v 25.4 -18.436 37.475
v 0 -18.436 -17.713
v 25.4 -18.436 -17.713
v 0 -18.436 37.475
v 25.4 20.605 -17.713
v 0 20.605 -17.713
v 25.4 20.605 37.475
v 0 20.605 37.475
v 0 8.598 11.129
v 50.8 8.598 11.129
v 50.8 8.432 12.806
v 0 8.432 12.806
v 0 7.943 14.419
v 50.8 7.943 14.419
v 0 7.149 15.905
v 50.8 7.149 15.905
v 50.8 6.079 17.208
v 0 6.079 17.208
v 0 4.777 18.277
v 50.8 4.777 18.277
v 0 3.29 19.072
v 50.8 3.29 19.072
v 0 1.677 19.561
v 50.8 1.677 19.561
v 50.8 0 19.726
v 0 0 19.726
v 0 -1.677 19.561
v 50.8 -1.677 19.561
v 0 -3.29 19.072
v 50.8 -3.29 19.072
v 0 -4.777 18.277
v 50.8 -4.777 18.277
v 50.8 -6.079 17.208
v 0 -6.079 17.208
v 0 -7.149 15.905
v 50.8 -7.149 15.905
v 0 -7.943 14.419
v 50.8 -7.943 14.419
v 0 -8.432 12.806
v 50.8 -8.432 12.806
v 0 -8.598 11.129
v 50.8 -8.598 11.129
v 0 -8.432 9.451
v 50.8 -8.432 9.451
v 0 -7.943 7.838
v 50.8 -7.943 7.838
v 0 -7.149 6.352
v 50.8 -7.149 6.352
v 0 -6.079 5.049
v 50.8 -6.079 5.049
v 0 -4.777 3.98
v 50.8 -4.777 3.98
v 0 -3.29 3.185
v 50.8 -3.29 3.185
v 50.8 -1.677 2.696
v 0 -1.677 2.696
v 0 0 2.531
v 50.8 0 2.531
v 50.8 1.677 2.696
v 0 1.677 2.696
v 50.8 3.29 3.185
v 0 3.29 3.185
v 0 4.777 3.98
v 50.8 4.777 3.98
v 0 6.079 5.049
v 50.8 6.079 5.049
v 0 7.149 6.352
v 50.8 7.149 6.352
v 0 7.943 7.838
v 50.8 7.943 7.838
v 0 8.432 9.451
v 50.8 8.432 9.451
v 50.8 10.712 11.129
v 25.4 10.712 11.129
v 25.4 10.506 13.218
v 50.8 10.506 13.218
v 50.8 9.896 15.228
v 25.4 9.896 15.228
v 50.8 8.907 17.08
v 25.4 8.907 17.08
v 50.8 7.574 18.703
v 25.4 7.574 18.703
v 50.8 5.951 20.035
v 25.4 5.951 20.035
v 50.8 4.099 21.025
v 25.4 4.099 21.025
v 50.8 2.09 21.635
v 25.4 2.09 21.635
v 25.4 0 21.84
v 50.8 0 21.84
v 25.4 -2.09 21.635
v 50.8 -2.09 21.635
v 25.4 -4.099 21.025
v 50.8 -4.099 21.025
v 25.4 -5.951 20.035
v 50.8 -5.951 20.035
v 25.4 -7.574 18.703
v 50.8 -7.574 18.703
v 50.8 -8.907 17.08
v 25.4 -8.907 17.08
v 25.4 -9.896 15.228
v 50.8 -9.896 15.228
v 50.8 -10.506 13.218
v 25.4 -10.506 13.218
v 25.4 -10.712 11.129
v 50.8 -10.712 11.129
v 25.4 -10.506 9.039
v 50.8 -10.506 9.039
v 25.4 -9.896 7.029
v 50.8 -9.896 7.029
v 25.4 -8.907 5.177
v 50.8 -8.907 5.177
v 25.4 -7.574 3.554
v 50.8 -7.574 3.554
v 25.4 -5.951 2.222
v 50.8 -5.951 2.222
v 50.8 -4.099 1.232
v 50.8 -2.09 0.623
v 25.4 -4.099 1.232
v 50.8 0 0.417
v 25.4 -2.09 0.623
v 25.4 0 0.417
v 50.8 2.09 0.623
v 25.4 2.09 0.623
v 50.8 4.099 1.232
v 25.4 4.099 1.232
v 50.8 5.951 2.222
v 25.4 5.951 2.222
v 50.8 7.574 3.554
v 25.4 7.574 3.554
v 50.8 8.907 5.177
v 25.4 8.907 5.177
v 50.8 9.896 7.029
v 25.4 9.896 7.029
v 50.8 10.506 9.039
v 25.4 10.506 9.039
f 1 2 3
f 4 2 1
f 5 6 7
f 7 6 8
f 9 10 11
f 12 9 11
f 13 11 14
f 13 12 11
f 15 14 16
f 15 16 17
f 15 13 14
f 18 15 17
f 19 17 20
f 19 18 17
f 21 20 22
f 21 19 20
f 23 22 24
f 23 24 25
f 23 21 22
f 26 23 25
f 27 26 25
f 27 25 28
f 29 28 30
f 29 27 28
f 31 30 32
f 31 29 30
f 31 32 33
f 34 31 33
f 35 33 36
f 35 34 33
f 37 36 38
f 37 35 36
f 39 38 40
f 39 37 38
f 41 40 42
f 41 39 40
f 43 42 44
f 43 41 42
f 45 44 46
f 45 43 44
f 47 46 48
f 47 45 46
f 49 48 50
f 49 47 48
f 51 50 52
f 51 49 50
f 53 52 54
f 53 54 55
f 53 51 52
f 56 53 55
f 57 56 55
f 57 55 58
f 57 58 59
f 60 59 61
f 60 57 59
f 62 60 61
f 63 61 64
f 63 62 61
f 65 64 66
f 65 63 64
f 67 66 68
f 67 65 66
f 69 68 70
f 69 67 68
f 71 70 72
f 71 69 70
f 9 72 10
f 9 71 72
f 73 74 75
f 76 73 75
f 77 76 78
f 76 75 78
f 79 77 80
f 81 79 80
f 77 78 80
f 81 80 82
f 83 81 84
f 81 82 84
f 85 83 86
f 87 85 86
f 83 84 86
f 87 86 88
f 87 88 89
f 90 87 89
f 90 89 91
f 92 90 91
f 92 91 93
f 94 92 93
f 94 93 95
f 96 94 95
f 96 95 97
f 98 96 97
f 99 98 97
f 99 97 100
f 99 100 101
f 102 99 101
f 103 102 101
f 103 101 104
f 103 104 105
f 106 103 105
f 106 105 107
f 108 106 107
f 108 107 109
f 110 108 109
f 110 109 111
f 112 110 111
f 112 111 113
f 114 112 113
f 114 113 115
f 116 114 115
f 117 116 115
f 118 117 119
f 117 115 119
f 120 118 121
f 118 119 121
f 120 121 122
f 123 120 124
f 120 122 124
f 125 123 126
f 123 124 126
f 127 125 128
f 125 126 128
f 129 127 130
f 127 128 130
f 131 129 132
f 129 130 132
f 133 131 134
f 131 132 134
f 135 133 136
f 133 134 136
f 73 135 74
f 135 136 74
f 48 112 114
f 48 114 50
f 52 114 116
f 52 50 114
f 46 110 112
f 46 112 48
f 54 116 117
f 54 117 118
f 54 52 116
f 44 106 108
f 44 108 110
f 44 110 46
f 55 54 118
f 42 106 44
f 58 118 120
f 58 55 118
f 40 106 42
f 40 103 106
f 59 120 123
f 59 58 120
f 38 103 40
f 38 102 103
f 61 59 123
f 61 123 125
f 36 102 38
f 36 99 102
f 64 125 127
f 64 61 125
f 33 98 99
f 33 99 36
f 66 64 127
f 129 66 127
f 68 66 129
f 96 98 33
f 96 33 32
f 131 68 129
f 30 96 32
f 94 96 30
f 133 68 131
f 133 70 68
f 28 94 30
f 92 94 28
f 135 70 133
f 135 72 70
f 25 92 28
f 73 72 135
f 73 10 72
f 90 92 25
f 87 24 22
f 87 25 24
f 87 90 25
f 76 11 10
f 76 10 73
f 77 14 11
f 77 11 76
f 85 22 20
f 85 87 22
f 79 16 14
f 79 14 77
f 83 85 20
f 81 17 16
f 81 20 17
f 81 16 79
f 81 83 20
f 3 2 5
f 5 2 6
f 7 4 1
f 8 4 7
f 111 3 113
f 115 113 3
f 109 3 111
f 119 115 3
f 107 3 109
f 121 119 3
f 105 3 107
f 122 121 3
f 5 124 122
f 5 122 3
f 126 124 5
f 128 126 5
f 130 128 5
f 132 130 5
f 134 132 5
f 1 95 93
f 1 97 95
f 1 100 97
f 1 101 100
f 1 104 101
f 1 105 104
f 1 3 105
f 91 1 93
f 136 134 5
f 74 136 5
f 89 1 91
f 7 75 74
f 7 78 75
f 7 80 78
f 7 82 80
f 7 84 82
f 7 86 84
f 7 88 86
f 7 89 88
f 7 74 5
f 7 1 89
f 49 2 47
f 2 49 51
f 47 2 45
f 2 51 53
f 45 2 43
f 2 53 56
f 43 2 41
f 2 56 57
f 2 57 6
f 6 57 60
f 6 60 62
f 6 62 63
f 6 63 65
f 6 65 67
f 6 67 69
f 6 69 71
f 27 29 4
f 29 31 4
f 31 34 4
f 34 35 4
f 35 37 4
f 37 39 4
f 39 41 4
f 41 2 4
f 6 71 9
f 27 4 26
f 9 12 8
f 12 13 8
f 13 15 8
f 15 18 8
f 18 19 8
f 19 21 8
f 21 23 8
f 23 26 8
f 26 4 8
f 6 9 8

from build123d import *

# Parameters (mm, degrees)
F0_R     = 10.711856
F0_R_2   = 8.597531
F1_DEPTH = 50.8
F0_W     = 39.041024
F0_H     = 55.187622
F2_DEPTH = 25.4


with BuildPart() as f1:
    # F0 (on Right) → F1 (new body)
    with BuildSketch(Plane.YZ):
        with Locations((0, 11.128576)):
            Circle(F0_R)
        with Locations((0, 11.128576)):
            Circle(F0_R_2, mode=Mode.SUBTRACT)
    extrude(amount=F1_DEPTH)

    # F0 (on Right) → F2 (join)
    with BuildSketch(Plane.YZ):
        with Locations((1.084473, 9.880754)):
            Rectangle(F0_W, F0_H)
        with Locations((0, 11.128576)):
            Circle(F0_R, mode=Mode.SUBTRACT)
    extrude(amount=F2_DEPTH)


solid = f1.part
